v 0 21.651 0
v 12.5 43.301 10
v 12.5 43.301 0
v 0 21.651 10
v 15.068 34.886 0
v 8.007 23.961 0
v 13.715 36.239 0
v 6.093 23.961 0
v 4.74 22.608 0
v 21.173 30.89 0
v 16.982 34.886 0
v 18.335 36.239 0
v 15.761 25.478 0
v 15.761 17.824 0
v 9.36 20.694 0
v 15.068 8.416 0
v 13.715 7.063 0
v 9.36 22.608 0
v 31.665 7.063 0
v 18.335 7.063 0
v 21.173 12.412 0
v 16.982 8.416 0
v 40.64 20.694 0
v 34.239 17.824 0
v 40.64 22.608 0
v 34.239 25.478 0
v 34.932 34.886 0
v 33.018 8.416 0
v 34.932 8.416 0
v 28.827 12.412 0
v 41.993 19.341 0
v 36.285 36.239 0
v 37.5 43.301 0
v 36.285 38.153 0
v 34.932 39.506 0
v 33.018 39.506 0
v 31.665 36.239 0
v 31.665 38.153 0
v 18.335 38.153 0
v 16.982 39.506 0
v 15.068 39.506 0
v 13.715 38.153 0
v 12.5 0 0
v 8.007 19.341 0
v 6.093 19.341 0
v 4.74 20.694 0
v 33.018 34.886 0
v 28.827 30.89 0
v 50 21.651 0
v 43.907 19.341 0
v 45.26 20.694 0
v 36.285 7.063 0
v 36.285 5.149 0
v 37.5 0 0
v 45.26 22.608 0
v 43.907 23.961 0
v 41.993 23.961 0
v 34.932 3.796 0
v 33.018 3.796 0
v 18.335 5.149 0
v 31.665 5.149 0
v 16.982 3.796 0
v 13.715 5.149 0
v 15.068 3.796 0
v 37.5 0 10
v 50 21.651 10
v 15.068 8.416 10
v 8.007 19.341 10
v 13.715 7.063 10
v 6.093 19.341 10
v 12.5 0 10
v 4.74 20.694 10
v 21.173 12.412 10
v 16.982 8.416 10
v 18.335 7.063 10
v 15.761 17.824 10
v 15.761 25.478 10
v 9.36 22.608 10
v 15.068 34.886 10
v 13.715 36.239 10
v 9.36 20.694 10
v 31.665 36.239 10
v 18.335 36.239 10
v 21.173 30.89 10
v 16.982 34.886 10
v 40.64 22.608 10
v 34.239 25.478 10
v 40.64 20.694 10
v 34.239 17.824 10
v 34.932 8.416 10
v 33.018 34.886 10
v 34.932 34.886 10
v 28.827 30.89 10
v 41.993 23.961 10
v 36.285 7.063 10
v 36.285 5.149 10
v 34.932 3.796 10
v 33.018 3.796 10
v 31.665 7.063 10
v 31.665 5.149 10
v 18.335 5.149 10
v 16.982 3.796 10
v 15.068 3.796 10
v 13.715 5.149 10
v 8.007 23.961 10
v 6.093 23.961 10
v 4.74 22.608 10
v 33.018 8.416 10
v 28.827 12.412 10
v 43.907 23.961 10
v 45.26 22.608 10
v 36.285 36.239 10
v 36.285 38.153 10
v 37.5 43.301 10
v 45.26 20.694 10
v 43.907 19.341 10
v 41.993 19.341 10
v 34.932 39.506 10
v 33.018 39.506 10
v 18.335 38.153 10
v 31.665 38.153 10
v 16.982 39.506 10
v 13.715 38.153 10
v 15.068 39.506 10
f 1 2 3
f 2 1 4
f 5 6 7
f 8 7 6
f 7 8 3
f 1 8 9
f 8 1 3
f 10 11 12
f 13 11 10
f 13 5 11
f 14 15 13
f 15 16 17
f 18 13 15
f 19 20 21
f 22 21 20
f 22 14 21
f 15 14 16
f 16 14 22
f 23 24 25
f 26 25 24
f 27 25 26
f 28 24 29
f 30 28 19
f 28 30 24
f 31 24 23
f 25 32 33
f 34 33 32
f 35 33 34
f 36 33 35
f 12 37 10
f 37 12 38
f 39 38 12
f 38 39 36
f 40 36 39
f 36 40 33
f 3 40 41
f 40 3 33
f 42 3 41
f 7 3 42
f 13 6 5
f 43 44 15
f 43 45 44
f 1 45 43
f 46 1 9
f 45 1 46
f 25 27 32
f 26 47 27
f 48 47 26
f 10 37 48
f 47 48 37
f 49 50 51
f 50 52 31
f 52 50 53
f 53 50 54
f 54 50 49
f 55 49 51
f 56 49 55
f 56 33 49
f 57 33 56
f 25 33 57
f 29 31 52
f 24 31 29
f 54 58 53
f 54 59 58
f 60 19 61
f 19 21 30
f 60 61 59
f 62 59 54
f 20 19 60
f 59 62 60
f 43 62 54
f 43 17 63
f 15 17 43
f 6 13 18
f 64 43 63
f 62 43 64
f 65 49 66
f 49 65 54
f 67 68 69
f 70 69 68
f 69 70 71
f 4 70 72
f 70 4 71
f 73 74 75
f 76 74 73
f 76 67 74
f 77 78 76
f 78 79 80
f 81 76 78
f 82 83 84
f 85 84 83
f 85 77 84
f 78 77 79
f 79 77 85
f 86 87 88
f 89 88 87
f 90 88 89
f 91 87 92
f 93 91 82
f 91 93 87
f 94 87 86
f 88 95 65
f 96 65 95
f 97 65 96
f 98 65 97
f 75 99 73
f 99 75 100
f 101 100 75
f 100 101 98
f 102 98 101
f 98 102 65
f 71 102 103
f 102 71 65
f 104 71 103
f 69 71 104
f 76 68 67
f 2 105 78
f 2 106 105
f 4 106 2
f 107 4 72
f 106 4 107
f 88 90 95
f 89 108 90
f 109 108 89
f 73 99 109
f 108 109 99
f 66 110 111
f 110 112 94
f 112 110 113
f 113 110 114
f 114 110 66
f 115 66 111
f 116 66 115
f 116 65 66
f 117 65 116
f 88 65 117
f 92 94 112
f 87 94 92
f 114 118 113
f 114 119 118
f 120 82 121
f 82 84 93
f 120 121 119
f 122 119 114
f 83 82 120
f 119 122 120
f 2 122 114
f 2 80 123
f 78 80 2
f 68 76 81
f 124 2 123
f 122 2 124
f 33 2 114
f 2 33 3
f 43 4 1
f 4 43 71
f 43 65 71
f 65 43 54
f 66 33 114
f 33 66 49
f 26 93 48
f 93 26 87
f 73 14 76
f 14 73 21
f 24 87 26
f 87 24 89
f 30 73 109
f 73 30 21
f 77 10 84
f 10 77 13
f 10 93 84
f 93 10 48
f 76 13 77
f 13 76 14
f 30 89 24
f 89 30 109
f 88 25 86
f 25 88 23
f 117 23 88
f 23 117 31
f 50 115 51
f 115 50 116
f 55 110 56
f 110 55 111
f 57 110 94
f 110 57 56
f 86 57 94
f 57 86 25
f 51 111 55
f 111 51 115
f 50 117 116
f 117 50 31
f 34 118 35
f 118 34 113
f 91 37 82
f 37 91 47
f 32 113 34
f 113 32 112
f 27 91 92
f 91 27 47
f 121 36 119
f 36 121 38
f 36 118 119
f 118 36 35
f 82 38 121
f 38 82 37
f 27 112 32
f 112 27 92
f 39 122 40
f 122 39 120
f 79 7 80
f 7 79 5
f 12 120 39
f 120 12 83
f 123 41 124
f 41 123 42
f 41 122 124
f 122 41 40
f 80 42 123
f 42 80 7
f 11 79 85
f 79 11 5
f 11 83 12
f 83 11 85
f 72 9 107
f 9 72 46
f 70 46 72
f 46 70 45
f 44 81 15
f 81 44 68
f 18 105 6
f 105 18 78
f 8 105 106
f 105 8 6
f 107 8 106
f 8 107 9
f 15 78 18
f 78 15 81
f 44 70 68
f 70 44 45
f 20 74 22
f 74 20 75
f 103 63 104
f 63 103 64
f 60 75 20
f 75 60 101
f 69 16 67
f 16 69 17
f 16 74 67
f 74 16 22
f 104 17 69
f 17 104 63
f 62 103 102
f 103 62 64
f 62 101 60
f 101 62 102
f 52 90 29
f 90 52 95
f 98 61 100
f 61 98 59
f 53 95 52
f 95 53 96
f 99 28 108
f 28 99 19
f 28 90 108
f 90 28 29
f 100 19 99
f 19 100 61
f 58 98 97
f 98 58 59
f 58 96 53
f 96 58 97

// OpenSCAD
$fn = 32;

// ----------------------------------------------------------------------
// Polygon plate: 6-gon R25, 6 bolt windows
// ----------------------------------------------------------------------

// --- parameters (mm) ---
sides = 6;                // number of polygon sides
plate_r = 25;             // circumscribed radius of the polygon
bore_r = 10;              // centre bore radius
bolts = 6;                // number of bolt windows
ring_r = 17.95;           // bolt-circle radius
bolt_r = 2.5;             // bolt window radius
plate_t = 10;             // plate thickness, Z (extrusion height)

plate_d = 2 * plate_r;  // circumscribed diameter
bore_d = 2 * bore_r;  // centre bore diameter
bolt_d = 2 * bolt_r;  // bolt window diameter
ring_d = 2 * ring_r;  // bolt-circle diameter

profile = [[50, 21.651], [37.5, 43.301], [12.5, 43.301], [0, 21.651], [12.5, 0], [37.5, 0]];  // primary outline, 6 points, counter clockwise
void_1 = [[34.239, 25.478], [28.827, 30.89], [21.173, 30.89], [15.761, 25.478], [15.761, 17.824], [21.173, 12.412], [28.827, 12.412], [34.239, 17.824]];  // centre bore, 8 points
void_2 = [[45.26, 22.608], [43.907, 23.961], [41.993, 23.961], [40.64, 22.608], [40.64, 20.694], [41.993, 19.341], [43.907, 19.341], [45.26, 20.694]];  // bolt window 1, 8 points
void_3 = [[36.285, 38.153], [34.932, 39.506], [33.018, 39.506], [31.665, 38.153], [31.665, 36.239], [33.018, 34.886], [34.932, 34.886], [36.285, 36.239]];  // bolt window 2, 8 points
void_4 = [[18.335, 38.153], [16.982, 39.506], [15.068, 39.506], [13.715, 38.153], [13.715, 36.239], [15.068, 34.886], [16.982, 34.886], [18.335, 36.239]];  // bolt window 3, 8 points
void_5 = [[9.36, 22.608], [8.007, 23.961], [6.093, 23.961], [4.74, 22.608], [4.74, 20.694], [6.093, 19.341], [8.007, 19.341], [9.36, 20.694]];  // bolt window 4, 8 points
void_6 = [[18.335, 7.063], [16.982, 8.416], [15.068, 8.416], [13.715, 7.063], [13.715, 5.149], [15.068, 3.796], [16.982, 3.796], [18.335, 5.149]];  // bolt window 5, 8 points
void_7 = [[36.285, 7.063], [34.932, 8.416], [33.018, 8.416], [31.665, 7.063], [31.665, 5.149], [33.018, 3.796], [34.932, 3.796], [36.285, 5.149]];  // bolt window 6, 8 points

// --- the one profile operation ---
difference() {
  linear_extrude(height = plate_t) polygon(points = profile);
  translate([0, 0, -1])
    linear_extrude(height = plate_t + 2) polygon(points = void_1);
  translate([0, 0, -1])
    linear_extrude(height = plate_t + 2) polygon(points = void_2);
  translate([0, 0, -1])
    linear_extrude(height = plate_t + 2) polygon(points = void_3);
  translate([0, 0, -1])
    linear_extrude(height = plate_t + 2) polygon(points = void_4);
  translate([0, 0, -1])
    linear_extrude(height = plate_t + 2) polygon(points = void_5);
  translate([0, 0, -1])
    linear_extrude(height = plate_t + 2) polygon(points = void_6);
  translate([0, 0, -1])
    linear_extrude(height = plate_t + 2) polygon(points = void_7);
}
